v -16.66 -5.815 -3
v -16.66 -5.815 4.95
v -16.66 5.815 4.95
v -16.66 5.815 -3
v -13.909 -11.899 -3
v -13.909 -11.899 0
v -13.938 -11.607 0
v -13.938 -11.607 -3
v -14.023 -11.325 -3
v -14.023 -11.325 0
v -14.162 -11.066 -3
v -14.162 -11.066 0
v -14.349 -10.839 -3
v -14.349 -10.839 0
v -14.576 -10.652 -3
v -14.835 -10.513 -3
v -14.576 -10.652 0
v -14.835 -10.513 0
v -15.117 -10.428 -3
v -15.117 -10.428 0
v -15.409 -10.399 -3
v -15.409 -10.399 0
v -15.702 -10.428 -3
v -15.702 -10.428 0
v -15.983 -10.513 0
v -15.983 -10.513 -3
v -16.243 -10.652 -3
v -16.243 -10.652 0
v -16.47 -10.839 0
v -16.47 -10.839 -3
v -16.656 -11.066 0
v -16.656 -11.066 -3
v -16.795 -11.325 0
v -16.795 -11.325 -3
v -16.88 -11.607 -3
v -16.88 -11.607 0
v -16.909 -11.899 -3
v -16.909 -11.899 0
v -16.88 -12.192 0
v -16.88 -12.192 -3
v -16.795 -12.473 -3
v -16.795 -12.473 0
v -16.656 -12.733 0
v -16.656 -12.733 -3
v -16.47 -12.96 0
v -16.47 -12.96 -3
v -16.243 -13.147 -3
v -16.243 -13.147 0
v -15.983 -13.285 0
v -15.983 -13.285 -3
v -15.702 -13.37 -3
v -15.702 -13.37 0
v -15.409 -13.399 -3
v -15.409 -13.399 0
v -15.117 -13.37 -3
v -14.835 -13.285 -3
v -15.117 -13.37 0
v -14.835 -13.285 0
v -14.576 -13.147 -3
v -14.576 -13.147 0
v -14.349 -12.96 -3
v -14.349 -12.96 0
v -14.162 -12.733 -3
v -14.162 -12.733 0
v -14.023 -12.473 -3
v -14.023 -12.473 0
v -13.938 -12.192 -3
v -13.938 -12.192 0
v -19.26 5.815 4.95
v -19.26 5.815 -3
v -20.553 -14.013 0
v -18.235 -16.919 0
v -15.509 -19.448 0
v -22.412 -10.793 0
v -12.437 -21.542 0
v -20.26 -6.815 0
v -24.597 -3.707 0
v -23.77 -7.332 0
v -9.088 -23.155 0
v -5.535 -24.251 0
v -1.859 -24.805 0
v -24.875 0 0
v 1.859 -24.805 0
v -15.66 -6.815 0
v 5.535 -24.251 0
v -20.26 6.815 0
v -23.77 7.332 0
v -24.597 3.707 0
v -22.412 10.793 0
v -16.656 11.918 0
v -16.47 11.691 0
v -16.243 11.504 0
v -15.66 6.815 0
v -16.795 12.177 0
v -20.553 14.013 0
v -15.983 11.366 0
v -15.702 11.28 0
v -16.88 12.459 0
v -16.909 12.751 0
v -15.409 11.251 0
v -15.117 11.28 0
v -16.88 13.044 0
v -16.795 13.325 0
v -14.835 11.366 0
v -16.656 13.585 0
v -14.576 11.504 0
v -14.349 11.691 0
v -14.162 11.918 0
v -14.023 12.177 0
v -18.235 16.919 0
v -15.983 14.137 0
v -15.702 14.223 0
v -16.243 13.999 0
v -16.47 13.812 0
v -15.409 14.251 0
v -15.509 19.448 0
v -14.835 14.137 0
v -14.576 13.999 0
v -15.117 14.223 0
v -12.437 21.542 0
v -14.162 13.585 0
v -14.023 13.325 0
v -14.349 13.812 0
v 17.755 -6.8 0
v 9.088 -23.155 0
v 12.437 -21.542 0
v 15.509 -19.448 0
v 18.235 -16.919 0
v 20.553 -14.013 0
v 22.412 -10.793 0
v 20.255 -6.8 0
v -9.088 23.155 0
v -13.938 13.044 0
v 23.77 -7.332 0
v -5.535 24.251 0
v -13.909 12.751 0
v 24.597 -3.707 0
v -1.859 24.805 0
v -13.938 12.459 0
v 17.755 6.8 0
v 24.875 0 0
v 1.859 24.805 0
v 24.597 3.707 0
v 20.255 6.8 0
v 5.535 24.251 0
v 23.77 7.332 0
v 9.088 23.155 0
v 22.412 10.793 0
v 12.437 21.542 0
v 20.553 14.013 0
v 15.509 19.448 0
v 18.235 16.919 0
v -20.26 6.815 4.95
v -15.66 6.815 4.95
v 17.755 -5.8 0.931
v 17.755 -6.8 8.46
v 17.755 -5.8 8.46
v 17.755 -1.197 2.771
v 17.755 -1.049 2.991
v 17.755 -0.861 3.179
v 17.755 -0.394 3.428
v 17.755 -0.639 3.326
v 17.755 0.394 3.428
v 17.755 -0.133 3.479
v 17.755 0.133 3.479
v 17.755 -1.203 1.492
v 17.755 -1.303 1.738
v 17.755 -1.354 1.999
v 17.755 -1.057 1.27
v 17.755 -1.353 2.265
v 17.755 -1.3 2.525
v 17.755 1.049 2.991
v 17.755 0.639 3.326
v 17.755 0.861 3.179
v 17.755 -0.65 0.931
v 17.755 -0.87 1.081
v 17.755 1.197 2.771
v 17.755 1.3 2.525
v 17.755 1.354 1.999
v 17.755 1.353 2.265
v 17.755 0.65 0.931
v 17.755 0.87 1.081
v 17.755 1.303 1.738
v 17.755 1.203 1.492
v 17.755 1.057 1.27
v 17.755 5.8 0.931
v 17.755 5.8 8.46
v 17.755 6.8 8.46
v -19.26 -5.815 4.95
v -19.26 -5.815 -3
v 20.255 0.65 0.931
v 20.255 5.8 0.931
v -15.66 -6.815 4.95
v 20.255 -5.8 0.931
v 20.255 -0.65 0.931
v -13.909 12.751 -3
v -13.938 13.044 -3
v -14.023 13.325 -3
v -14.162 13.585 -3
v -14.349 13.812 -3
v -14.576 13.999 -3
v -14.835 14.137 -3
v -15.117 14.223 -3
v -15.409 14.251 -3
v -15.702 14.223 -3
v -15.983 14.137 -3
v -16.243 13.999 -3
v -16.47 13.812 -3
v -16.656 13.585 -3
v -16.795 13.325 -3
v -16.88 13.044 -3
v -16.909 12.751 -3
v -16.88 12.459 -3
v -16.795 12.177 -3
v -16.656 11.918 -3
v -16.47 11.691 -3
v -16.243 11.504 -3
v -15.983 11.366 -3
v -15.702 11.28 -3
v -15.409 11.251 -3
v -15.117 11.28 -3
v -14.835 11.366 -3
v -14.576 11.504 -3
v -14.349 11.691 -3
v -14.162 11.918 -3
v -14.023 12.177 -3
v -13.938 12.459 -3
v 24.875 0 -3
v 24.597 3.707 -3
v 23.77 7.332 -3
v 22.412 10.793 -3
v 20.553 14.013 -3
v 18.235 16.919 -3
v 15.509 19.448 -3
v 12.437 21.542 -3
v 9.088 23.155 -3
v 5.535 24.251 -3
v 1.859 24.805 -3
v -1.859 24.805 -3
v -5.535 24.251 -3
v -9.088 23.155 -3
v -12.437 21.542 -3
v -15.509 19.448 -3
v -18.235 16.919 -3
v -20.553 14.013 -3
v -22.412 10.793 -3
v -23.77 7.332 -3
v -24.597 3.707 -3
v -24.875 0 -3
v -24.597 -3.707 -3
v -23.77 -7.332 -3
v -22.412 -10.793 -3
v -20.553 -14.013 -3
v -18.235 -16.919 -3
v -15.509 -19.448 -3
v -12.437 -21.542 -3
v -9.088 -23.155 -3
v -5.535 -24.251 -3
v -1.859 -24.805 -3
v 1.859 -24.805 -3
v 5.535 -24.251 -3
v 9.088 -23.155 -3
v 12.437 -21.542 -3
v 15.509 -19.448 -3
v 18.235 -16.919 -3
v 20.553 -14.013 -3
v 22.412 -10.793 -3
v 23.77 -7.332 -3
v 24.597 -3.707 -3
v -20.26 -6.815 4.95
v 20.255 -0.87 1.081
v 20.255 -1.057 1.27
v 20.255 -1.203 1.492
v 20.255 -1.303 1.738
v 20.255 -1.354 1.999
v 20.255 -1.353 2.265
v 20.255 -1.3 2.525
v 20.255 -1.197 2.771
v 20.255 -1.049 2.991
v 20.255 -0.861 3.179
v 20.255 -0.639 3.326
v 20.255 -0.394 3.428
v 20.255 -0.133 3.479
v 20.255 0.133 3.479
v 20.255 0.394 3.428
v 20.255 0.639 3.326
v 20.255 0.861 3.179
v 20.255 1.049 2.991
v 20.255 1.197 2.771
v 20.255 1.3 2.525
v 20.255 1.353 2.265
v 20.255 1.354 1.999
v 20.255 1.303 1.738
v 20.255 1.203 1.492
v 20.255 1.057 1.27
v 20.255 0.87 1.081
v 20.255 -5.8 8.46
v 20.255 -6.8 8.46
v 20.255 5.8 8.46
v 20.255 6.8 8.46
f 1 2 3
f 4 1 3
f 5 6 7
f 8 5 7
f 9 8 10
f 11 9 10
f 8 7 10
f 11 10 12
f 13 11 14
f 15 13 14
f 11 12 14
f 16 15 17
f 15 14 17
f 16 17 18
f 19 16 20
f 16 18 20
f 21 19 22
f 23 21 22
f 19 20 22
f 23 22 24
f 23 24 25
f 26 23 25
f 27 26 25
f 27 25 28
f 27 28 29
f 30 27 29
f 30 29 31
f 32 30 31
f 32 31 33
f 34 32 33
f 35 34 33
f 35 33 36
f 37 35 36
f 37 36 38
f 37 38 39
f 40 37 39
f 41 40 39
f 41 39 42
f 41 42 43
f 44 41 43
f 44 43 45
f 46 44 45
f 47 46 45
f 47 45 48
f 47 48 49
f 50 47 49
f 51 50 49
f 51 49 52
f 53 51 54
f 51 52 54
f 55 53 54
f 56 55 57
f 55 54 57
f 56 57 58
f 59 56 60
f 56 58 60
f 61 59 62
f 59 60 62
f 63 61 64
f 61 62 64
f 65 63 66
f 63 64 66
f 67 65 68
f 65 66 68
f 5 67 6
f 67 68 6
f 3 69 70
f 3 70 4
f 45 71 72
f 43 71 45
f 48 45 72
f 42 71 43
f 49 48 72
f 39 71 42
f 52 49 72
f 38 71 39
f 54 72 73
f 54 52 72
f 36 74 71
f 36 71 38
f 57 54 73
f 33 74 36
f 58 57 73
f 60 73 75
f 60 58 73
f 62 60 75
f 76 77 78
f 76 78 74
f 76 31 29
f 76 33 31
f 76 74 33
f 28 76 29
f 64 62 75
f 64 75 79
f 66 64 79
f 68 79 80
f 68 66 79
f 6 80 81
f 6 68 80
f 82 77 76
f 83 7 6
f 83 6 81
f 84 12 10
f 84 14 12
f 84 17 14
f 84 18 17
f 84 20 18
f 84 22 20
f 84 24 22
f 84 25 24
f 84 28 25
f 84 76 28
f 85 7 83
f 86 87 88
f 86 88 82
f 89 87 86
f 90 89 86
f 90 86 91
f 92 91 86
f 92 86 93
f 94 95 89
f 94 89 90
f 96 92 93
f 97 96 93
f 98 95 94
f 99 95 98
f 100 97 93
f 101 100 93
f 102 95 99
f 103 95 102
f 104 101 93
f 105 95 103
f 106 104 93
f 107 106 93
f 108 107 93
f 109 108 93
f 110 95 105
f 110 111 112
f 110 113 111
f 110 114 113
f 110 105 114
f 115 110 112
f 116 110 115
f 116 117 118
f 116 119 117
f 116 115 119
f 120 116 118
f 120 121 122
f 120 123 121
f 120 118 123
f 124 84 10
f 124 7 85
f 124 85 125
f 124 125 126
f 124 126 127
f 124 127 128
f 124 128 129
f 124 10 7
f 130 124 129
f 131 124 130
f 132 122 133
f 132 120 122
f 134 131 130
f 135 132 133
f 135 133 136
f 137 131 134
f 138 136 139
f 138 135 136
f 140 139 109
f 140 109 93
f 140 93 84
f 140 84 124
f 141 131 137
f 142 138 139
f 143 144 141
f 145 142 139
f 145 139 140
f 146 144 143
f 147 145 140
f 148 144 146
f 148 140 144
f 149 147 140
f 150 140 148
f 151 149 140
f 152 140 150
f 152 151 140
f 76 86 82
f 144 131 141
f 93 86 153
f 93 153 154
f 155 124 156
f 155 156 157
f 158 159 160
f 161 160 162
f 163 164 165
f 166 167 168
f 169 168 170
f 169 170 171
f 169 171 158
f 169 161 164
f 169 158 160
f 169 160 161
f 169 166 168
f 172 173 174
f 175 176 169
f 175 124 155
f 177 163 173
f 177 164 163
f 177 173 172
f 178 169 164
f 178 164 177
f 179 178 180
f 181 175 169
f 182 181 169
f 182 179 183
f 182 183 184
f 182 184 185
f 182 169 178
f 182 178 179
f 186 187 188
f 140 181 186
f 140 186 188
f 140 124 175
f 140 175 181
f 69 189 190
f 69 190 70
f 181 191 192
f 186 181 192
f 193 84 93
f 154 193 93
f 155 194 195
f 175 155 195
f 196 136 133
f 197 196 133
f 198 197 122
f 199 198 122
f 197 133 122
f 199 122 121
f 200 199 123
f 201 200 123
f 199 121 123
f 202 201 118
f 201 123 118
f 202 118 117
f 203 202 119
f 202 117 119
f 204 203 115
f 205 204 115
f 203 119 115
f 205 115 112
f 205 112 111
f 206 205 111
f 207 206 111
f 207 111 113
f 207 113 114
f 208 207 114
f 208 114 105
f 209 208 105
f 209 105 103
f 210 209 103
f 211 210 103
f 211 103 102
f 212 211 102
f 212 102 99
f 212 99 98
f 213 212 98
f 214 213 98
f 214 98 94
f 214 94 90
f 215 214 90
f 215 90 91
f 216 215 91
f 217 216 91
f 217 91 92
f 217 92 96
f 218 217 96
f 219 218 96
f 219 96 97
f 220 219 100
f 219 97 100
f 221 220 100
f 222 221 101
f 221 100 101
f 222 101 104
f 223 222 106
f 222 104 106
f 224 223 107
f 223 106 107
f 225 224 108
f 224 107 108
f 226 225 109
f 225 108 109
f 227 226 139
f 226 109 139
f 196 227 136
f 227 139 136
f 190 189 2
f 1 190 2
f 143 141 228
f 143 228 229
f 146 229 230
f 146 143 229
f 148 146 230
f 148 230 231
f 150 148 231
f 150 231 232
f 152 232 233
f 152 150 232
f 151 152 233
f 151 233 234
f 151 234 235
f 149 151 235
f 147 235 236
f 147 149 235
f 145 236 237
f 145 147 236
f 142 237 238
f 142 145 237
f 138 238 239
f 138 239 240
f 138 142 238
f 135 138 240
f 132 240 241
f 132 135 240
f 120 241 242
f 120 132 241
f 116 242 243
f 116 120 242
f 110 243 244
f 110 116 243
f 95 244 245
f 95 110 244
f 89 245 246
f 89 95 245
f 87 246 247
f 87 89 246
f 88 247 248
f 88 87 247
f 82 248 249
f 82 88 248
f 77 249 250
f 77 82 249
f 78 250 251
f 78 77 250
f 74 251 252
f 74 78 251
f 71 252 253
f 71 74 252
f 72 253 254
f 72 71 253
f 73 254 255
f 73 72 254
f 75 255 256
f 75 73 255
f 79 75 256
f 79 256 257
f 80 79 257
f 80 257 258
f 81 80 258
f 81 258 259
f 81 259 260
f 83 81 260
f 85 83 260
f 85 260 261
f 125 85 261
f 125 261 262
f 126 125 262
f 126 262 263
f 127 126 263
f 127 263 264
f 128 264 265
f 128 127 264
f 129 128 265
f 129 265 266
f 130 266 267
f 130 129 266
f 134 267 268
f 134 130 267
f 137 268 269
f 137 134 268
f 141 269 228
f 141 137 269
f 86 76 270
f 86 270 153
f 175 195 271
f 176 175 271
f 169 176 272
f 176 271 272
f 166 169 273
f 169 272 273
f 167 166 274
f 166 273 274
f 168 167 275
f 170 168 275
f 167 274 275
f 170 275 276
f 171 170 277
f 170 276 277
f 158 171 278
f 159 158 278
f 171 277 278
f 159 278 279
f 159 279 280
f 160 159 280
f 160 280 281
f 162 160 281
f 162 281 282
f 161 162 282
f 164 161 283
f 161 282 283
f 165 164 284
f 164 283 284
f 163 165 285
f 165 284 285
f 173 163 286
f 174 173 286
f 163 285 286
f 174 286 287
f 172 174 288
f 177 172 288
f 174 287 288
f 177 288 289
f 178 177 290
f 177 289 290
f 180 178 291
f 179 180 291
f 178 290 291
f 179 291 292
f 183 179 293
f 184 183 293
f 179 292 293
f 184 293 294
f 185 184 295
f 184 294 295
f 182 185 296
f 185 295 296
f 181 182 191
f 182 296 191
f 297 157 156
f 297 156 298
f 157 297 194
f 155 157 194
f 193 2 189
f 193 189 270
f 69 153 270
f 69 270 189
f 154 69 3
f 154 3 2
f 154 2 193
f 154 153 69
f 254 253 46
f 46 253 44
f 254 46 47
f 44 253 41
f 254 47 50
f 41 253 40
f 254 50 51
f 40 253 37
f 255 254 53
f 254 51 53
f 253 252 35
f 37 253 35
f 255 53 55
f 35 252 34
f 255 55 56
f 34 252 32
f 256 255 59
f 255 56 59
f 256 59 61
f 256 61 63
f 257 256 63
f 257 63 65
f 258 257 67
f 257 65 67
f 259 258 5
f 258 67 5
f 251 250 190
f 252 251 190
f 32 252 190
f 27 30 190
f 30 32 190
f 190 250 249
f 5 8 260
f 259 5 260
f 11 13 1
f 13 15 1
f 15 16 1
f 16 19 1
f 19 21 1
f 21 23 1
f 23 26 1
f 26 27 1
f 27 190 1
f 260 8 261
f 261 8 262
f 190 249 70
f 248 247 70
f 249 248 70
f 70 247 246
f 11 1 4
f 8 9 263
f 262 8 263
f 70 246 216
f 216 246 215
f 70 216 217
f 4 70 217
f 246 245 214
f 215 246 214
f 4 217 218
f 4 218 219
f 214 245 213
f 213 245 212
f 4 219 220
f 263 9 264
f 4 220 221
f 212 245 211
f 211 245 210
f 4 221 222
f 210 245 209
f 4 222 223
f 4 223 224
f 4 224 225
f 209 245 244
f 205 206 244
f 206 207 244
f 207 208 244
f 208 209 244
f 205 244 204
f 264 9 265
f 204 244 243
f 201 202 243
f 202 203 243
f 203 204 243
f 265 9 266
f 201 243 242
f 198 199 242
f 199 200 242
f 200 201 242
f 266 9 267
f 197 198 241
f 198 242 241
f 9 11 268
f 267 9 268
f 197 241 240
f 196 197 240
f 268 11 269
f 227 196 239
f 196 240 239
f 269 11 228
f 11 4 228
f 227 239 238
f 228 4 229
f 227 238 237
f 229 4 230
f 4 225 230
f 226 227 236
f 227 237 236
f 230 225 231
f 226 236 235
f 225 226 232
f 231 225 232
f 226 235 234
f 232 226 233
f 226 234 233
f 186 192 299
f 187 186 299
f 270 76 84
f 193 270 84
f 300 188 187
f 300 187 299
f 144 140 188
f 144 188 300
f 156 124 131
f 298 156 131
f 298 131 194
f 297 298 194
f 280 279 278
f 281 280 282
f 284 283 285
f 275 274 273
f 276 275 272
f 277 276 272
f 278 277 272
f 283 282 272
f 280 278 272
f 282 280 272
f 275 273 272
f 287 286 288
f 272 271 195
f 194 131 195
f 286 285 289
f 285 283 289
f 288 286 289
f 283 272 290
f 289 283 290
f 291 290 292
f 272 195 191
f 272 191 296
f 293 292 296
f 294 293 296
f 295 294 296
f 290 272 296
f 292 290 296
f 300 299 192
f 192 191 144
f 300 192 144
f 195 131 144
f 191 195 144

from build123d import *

# Parameters (mm, degrees)
SKETCH1_R           = 24.875
BOSS_EXTRUDE2_DEPTH = 3
SKETCH1_4_W         = 2.5
SKETCH1_4_H         = 13.6
BOSS_EXTRUDE3_DEPTH = 8.46
CUT_EXTRUDE1_DEPTH  = 2.5
SKETCH5_W           = 4.6
SKETCH5_H           = 13.63
BOSS_EXTRUDE4_DEPTH = 4.95
SKETCH9_W           = 2.6
SKETCH9_H           = 11.63
CUT_EXTRUDE2_DEPTH  = 7.95
SKETCH10_R          = 1.5
CUT_EXTRUDE3_DEPTH  = 4.95


with BuildPart() as part:
    # Sketch1 → Boss-Extrude2 (new body)
    with BuildSketch(Plane.XY):
        Circle(SKETCH1_R)
    extrude(amount=-BOSS_EXTRUDE2_DEPTH)

    # Sketch1<4> → Boss-Extrude3 (add)
    with BuildSketch(Plane.XY):
        with Locations((19.005, 0)):
            Rectangle(SKETCH1_4_W, SKETCH1_4_H)
    extrude(amount=BOSS_EXTRUDE3_DEPTH)

    # Sketch4 → Cut-Extrude1 (cut)
    with BuildSketch(Plane(origin=(20.255, 0, 0), x_dir=(0, 0, -1), z_dir=(1, 0, 0))):
        with BuildLine():
            ThreePointArc((-0.931303911, -0.65), (-3.48591682, 0), (-0.931303911, 0.65))
            Line((-0.931303911, 0.65), (-0.931303911, 5.8))
            Line((-0.931303911, 5.8), (-8.46, 5.8))
            Line((-8.46, 5.8), (-8.46, -5.8))
            Line((-8.46, -5.8), (-0.931303911, -5.8))
            Line((-0.931303911, -5.8), (-0.931303911, -0.65))
        make_face()
    extrude(amount=-CUT_EXTRUDE1_DEPTH, mode=Mode.SUBTRACT)

    # Sketch5 → Boss-Extrude4 (add)
    with BuildSketch(Plane.XY):
        with Locations((-17.96, 0)):
            Rectangle(SKETCH5_W, SKETCH5_H)
    extrude(amount=BOSS_EXTRUDE4_DEPTH)

    # Sketch9 → Cut-Extrude2 (cut)
    with BuildSketch(Plane.XY.offset(4.95)):
        with Locations((-17.96, 0)):
            Rectangle(SKETCH9_W, SKETCH9_H)
    extrude(amount=-CUT_EXTRUDE2_DEPTH, mode=Mode.SUBTRACT)

    # Sketch10 → Cut-Extrude3 (cut)
    with BuildSketch(Plane.XY):
        with Locations((-15.409206931, 12.75144494)):
            Circle(SKETCH10_R)
        with Locations((-15.409206931, -11.899319199)):
            Circle(SKETCH10_R)
    extrude(amount=-CUT_EXTRUDE3_DEPTH, mode=Mode.SUBTRACT)


solid = part.part
